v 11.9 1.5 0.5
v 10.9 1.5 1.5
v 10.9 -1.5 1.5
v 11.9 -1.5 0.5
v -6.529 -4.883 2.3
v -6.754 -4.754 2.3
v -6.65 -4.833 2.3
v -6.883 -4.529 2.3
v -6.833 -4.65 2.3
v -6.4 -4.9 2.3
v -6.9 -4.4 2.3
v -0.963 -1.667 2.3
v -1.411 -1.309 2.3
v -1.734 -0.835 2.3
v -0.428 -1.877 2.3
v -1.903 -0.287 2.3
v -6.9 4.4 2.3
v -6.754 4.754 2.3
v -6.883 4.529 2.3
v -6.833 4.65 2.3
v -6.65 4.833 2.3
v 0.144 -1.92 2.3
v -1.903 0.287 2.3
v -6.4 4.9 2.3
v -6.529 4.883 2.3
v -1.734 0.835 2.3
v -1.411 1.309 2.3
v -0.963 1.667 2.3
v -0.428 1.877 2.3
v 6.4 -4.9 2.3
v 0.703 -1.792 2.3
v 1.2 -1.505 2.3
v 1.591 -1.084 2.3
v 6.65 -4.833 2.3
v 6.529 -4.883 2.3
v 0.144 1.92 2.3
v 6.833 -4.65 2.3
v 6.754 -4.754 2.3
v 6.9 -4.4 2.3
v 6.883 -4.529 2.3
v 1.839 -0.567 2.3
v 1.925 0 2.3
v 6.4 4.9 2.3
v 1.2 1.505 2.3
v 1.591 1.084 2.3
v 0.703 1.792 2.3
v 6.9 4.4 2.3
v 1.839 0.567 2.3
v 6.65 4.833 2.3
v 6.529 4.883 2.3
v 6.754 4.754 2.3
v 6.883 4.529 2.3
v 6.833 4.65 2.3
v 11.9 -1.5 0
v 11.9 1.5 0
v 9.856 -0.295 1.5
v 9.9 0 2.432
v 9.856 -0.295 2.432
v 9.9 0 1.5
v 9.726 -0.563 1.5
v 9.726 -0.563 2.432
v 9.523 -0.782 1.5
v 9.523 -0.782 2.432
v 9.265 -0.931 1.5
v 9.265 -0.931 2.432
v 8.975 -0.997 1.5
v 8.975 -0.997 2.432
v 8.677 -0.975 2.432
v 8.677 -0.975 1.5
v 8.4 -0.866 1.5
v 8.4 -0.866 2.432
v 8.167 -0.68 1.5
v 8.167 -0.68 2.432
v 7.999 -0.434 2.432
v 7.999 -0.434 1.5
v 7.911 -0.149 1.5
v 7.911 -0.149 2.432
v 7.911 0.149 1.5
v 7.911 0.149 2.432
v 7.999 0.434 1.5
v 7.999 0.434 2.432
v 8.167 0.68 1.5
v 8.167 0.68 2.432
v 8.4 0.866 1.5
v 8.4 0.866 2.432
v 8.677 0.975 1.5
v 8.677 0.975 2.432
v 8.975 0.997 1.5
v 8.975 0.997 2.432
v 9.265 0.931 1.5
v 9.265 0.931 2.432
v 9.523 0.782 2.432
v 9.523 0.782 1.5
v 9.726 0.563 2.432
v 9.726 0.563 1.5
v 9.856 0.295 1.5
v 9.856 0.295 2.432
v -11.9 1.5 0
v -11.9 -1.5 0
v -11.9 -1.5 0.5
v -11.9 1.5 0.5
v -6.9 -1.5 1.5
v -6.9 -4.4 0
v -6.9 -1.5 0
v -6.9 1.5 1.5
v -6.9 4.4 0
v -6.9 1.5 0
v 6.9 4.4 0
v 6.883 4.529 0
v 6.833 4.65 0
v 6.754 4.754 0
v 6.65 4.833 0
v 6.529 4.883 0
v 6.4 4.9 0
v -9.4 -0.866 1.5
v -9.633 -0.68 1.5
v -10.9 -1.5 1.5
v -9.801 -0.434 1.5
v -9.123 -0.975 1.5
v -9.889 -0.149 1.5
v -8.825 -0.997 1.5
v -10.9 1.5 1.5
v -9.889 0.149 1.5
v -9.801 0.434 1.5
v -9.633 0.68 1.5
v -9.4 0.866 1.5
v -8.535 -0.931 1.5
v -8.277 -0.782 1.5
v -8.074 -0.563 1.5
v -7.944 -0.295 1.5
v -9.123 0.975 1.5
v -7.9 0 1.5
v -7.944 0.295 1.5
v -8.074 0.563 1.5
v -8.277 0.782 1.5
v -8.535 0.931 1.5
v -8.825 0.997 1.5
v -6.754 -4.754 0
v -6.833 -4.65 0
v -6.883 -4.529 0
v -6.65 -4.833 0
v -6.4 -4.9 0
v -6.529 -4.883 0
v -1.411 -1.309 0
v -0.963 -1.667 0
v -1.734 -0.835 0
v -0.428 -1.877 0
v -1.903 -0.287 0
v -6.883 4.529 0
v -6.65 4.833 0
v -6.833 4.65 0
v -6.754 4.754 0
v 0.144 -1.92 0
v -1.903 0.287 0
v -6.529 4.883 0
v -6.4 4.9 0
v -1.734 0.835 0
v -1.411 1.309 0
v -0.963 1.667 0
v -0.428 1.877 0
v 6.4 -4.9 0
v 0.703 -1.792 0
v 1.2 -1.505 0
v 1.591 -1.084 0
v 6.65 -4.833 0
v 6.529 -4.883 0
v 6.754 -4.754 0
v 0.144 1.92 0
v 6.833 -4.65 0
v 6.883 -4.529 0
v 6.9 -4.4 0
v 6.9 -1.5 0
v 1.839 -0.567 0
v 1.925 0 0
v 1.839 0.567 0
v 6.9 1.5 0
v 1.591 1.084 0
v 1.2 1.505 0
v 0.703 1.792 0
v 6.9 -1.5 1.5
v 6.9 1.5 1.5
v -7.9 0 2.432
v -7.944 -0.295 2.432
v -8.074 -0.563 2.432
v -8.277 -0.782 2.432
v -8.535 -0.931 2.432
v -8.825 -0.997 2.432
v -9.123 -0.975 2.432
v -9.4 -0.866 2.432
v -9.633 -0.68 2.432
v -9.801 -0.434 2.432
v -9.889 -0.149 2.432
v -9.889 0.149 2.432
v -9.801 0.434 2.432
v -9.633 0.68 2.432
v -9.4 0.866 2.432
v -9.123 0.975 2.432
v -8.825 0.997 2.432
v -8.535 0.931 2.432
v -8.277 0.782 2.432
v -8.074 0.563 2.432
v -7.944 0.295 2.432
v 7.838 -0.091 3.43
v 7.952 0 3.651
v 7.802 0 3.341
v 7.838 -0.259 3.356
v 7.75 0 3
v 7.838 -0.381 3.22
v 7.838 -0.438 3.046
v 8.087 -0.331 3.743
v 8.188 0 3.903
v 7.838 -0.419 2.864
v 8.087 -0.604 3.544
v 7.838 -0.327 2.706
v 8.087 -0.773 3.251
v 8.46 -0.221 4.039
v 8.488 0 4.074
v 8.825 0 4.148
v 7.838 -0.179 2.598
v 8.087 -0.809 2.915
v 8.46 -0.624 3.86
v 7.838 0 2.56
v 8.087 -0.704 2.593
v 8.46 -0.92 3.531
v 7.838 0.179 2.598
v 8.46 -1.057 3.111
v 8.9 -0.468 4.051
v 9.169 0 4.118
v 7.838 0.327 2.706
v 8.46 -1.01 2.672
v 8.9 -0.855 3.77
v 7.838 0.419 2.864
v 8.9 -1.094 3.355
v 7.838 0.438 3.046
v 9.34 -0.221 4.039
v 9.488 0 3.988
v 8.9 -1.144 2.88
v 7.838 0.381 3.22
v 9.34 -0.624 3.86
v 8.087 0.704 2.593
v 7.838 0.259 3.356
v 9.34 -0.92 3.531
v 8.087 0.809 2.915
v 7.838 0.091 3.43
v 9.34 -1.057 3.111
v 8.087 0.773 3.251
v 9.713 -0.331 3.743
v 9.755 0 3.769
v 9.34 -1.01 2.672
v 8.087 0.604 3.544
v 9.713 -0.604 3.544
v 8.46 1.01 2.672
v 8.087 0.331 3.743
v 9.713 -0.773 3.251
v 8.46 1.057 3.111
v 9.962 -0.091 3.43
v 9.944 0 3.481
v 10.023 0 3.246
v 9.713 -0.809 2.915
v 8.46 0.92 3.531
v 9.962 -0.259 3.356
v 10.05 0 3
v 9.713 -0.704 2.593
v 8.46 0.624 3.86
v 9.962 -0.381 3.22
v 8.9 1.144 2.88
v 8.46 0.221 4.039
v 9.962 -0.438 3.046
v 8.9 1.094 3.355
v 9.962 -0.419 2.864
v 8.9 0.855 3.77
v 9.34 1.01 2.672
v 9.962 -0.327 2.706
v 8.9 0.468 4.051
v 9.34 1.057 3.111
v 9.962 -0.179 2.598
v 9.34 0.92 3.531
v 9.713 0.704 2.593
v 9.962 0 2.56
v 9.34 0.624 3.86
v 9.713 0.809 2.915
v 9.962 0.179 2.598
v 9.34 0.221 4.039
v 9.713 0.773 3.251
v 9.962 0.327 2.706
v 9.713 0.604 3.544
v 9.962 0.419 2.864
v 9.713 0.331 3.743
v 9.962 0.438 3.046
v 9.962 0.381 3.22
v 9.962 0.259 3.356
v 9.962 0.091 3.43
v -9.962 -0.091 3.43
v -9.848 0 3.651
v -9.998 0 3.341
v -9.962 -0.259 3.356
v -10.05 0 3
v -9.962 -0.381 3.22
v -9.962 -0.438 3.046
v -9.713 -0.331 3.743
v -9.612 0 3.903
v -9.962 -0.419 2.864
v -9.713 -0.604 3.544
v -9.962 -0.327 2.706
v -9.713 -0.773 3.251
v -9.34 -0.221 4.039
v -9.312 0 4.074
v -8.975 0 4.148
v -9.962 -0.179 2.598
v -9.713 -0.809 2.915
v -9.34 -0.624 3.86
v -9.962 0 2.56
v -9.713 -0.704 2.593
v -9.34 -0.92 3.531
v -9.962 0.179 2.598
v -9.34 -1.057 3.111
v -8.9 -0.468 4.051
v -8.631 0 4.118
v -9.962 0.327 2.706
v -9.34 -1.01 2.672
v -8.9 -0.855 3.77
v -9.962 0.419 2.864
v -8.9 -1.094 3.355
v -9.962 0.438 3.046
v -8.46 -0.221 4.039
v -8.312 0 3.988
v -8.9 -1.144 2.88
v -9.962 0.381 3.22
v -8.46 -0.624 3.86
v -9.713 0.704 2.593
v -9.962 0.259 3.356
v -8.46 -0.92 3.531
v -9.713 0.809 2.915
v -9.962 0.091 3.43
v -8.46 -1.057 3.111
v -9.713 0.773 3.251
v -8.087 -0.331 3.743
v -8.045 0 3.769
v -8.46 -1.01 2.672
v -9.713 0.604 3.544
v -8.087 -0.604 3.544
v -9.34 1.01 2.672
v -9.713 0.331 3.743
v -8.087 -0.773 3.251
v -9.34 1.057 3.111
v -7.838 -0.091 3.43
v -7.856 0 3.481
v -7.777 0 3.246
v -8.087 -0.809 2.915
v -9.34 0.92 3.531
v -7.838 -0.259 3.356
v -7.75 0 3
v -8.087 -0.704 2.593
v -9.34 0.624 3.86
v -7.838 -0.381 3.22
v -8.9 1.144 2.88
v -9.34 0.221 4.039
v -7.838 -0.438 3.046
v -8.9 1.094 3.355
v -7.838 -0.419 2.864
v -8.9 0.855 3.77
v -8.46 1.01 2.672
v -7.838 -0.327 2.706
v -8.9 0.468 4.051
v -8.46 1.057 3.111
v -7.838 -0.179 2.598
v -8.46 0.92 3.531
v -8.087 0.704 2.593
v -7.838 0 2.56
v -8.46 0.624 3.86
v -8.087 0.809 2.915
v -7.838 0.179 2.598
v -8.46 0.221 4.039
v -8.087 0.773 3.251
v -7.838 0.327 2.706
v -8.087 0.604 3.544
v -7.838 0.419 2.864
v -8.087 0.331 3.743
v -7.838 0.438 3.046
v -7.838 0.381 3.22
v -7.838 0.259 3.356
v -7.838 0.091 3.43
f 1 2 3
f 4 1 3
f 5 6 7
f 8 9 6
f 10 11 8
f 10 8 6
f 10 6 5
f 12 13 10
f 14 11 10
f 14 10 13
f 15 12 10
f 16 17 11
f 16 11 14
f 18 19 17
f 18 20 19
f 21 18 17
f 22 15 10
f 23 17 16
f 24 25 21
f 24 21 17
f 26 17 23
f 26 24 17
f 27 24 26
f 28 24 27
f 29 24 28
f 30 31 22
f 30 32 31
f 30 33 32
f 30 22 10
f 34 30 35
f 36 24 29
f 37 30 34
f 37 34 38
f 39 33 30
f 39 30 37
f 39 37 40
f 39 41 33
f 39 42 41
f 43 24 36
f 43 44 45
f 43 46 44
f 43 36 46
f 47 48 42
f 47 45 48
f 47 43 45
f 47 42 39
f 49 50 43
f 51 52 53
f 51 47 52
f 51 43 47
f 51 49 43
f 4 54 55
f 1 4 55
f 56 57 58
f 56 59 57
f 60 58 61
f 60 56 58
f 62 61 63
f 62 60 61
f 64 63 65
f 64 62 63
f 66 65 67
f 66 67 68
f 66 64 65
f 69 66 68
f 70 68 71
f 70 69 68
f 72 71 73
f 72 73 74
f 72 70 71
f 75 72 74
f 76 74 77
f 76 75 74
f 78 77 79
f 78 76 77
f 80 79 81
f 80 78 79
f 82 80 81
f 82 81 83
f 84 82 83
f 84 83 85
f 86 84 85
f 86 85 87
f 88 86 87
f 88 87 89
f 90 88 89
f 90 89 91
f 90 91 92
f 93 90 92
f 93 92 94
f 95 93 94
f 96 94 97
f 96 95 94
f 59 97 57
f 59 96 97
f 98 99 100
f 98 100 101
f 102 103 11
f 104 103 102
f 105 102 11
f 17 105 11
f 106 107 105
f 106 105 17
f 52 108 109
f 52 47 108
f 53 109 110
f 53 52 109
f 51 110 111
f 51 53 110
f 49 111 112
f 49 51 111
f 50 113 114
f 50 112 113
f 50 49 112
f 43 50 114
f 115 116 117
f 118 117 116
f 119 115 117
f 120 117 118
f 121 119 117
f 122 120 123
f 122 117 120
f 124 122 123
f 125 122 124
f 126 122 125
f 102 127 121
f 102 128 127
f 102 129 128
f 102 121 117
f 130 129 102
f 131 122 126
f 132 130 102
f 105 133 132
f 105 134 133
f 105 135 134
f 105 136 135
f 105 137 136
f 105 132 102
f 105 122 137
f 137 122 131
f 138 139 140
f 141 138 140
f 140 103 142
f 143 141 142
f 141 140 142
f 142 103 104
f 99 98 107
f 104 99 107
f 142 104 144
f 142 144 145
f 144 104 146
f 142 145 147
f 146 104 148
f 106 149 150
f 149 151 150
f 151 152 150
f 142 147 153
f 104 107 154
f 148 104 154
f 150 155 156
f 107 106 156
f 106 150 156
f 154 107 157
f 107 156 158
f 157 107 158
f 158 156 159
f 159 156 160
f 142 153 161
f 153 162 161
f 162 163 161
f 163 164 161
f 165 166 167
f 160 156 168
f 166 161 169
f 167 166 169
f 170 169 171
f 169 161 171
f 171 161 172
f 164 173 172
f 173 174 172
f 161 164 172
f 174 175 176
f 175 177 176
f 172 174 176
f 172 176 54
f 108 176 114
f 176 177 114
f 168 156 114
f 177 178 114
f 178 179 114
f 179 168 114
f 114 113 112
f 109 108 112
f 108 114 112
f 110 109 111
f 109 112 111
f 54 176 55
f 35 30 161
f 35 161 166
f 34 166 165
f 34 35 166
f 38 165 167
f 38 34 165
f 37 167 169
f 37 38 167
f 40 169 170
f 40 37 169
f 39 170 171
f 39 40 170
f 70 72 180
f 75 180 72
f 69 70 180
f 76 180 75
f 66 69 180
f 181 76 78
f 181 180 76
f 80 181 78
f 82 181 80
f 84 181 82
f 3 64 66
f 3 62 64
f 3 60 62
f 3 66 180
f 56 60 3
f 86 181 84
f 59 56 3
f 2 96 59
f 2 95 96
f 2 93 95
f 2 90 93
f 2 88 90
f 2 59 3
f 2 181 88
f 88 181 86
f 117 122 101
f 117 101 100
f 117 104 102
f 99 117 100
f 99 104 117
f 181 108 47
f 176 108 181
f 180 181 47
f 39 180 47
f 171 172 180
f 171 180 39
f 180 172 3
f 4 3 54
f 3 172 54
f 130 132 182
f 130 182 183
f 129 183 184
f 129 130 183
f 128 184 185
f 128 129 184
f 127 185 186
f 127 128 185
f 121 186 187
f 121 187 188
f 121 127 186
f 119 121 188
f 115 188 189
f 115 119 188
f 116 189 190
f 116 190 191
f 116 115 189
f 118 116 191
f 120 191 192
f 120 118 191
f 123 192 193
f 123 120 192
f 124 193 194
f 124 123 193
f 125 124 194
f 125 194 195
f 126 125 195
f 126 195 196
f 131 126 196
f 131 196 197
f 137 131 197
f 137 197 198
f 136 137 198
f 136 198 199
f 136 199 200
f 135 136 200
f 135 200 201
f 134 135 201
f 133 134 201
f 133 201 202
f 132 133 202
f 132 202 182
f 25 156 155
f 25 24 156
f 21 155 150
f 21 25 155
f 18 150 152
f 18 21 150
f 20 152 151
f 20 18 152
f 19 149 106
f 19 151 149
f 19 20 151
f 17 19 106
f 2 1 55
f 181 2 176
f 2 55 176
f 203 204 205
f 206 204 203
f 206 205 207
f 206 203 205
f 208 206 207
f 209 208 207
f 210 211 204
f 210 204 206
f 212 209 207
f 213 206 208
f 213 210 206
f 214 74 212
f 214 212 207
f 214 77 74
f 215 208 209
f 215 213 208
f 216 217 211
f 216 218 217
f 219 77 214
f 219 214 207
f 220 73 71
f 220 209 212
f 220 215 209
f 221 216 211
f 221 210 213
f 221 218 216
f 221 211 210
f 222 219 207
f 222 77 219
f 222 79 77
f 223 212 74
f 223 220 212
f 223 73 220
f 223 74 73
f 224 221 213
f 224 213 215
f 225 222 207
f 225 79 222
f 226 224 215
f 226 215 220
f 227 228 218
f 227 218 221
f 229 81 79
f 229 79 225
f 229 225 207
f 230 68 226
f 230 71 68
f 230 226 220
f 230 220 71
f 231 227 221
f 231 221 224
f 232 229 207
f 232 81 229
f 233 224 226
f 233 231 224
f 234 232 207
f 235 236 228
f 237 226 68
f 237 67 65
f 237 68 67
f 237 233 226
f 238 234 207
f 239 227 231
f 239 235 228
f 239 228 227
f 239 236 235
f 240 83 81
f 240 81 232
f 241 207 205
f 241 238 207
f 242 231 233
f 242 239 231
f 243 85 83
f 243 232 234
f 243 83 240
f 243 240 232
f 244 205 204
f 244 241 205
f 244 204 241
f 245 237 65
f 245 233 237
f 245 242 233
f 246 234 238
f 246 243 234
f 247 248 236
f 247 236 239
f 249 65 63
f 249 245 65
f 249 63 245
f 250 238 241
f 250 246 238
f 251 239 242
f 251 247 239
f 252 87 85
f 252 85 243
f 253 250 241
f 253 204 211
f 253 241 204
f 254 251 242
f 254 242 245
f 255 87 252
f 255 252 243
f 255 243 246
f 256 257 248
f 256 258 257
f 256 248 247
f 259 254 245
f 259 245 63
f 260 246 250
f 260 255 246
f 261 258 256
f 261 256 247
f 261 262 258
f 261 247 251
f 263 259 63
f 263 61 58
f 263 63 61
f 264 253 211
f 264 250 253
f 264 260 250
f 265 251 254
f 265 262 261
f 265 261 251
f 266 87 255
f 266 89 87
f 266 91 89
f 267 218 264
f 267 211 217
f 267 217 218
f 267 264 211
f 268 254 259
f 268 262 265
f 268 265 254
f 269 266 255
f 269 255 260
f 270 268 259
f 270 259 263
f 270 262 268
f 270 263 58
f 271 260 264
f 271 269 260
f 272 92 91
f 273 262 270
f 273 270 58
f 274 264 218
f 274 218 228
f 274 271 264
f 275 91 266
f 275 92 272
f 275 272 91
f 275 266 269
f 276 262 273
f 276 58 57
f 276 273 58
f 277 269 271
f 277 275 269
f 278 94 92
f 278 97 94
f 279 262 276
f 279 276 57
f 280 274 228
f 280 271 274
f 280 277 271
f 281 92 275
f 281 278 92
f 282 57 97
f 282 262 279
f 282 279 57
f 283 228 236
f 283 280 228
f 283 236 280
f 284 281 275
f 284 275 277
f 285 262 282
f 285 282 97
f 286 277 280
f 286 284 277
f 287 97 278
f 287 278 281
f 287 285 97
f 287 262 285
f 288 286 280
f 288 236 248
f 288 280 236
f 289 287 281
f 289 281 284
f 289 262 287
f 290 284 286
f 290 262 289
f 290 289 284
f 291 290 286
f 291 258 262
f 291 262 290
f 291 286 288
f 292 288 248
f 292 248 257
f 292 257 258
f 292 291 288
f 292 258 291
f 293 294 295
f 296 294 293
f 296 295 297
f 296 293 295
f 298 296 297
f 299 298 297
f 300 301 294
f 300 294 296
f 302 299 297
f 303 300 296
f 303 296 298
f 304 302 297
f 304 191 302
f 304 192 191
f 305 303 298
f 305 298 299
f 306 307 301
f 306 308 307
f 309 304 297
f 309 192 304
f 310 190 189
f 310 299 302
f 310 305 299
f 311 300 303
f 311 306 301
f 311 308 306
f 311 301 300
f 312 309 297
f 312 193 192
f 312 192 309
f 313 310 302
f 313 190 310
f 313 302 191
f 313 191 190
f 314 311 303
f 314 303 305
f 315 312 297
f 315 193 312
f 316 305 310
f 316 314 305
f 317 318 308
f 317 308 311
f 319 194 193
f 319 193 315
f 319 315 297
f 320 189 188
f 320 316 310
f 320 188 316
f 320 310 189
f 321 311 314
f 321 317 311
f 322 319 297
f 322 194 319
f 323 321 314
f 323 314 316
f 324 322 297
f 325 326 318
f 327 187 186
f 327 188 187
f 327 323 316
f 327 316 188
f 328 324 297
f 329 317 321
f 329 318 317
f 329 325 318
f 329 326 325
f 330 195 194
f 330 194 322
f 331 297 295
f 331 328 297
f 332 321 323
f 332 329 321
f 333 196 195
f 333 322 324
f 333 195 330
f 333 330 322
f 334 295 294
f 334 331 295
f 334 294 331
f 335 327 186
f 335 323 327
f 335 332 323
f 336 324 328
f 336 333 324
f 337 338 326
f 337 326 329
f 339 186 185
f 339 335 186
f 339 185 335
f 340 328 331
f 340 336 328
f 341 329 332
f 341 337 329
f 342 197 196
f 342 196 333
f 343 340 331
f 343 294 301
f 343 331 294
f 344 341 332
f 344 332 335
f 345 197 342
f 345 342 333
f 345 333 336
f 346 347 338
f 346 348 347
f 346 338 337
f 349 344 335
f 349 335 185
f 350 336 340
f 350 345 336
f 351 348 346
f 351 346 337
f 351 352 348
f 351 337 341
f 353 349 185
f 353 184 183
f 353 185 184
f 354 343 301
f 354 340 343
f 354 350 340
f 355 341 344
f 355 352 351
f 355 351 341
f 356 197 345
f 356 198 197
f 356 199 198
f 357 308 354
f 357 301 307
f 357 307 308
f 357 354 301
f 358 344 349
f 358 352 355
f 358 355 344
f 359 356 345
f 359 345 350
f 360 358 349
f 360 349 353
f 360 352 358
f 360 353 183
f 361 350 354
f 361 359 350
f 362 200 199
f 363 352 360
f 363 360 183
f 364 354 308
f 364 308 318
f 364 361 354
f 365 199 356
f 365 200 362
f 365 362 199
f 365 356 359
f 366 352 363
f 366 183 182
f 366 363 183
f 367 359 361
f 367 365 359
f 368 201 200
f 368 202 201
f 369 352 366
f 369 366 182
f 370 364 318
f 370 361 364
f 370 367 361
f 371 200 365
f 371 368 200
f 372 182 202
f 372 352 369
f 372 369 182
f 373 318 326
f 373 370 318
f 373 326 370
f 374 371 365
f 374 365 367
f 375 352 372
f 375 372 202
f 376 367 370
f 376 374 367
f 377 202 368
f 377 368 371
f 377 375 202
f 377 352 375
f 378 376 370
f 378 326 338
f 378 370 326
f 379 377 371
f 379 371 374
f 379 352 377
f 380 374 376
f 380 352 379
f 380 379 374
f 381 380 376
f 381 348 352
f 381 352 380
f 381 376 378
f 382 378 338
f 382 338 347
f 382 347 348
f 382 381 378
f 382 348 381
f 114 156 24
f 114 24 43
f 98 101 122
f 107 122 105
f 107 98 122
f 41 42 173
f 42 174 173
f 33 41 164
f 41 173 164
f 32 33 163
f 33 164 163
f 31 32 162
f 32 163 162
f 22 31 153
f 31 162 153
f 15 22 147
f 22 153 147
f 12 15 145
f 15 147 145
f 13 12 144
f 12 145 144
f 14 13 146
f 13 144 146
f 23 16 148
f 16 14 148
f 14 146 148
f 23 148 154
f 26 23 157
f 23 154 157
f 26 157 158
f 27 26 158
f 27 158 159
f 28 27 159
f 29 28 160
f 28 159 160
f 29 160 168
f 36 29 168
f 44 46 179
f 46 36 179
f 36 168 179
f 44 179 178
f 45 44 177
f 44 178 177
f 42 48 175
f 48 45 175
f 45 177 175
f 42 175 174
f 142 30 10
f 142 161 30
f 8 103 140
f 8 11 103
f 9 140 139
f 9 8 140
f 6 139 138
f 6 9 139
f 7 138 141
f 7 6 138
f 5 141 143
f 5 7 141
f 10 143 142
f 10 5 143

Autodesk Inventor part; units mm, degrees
ref_plane "YZ Plane" through (0, 0, 0) normal (1, 0, 0) x (0, 1, 0)
ref_plane "XZ Plane" through (0, 0, 0) normal (0, 1, 0) x (-1, 0, 0)
ref_plane "XY Plane" through (0, 0, 0) normal (0, 0, 1) x (1, 0, 0)
sketch "Sketch1" plane through (0, 0, 0) normal (0, 0, 1) x (1, 0, 0)
  line L0 (-6.9, 4.9) -> (6.9, 4.9)
  line L1 (6.9, 4.9) -> (6.9, -4.9)
  line L2 (6.9, -4.9) -> (-6.9, -4.9)
  line L3 (-6.9, -4.9) -> (-6.9, 4.9)
  circle A0 centre (0, 0) radius 1.925
  line L4 (-6.9, -1.5) -> (-11.9, -1.5)
  line L5 (-11.9, -1.5) -> (-11.9, 1.5)
  line L6 (-11.9, 1.5) -> (-6.9, 1.5)
  line L7 (-6.9, 1.5) -> (-6.9, -1.5)
  line L8 (6.9, -1.5) -> (11.9, -1.5)
  line L9 (11.9, -1.5) -> (11.9, 1.5)
  line L10 (11.9, 1.5) -> (6.9, 1.5)
  line L11 (6.9, 1.5) -> (6.9, -1.5)
  dimension "d0" = 13.8
  dimension "d1" = 9.8
  dimension "d2" = 6.9
  dimension "d3" = 4.9
  dimension "d6" = 3.85
  dimension "d7" = 3
  dimension "d8" = 1.5
  dimension "d9" = 5
  dimension "d10" = 5
extrude "Extrusion1" add sketch "Sketch1" along normal blind 2.3 contours L0 L1 L2 L3
extrude "Extrusion2" add sketch "Sketch1" along normal blind 1.5 contours L3 L4 L5 L6 | L10 L9 L8 L1
chamfer "Chamfer1" distance 1 angle 45 2 edges at (-11.9, 0, 1.5) (11.9, 0, 1.5)
sketch "Sketch2" plane through (0, 0, 1.5) normal (0, 0, 1) x (1, 0, 0)
  circle A0 centre (8.9, 0) radius 1
  line L0 (10.9, 1.5) -> (6.9, 1.5) projected
  line L1 (0, 0) -> (0.8425, 0) construction
  line L2 (6.9, -4.9) -> (6.9, 4.9) projected
  circle A1 centre (-8.9, 0) radius 1
  line L3 (-6.9, 4.9) -> (-6.9, -4.9) projected
  dimension "d17" = 2
  dimension "d19" = 2
  dimension "d20" = 2
  dimension "d21" = 2
extrude "Extrusion3" add sketch "Sketch2" along normal blind 1.5
sketch "Sketch3" plane through (0, 0, 0) normal (0, 1, 0) x (-1, 0, 0)
  line L0 (9.9, 3) -> (7.9, 3) projected
  circle A0 centre (8.9, 3) radius 1.15
  line L1 (7.9, 1.5) -> (7.9, 3) projected
  line L2 (9.9, 1.5) -> (9.9, 3) projected
  line L3 (-7.9, 3) -> (-9.9, 3) projected
  circle A1 centre (-8.9, 3) radius 1.15
  line L4 (-9.9, 1.5) -> (-9.9, 3) projected
  line L5 (9.9, 3) -> (10.05, 3)
  line L6 (7.9, 3) -> (7.75, 3)
  line L7 (-7.75, 3) -> (-10.05, 3)
  point P0 (0, 0)
  dimension "d24" = 0.15
  dimension "d25" = 0.15
revolve "Revolution1" add sketch "Sketch3" angle 360 about axis through (-9.9, 0, 3) along (-1, 0, 0) contours L0 L6 A0 L5 | L3 L7 A1
fillet "Fillet1" radius 0.5 4 edges at (-6.9, -4.9, 1.15) (-6.9, 4.9, 1.15) (6.9, 4.9, 1.15) (6.9, -4.9, 1.15)
equation "\"d2\" = 0.5 * d0"
equation "\"d3\" = 0.5 * d1"
equation "\"d8\" = 0.5 * d7"
equation "\"d10\" = d9"
equation "\"d20\" = d17"
equation "\"d21\" = d19"
properties part number "motor_cover_3DPrint"
